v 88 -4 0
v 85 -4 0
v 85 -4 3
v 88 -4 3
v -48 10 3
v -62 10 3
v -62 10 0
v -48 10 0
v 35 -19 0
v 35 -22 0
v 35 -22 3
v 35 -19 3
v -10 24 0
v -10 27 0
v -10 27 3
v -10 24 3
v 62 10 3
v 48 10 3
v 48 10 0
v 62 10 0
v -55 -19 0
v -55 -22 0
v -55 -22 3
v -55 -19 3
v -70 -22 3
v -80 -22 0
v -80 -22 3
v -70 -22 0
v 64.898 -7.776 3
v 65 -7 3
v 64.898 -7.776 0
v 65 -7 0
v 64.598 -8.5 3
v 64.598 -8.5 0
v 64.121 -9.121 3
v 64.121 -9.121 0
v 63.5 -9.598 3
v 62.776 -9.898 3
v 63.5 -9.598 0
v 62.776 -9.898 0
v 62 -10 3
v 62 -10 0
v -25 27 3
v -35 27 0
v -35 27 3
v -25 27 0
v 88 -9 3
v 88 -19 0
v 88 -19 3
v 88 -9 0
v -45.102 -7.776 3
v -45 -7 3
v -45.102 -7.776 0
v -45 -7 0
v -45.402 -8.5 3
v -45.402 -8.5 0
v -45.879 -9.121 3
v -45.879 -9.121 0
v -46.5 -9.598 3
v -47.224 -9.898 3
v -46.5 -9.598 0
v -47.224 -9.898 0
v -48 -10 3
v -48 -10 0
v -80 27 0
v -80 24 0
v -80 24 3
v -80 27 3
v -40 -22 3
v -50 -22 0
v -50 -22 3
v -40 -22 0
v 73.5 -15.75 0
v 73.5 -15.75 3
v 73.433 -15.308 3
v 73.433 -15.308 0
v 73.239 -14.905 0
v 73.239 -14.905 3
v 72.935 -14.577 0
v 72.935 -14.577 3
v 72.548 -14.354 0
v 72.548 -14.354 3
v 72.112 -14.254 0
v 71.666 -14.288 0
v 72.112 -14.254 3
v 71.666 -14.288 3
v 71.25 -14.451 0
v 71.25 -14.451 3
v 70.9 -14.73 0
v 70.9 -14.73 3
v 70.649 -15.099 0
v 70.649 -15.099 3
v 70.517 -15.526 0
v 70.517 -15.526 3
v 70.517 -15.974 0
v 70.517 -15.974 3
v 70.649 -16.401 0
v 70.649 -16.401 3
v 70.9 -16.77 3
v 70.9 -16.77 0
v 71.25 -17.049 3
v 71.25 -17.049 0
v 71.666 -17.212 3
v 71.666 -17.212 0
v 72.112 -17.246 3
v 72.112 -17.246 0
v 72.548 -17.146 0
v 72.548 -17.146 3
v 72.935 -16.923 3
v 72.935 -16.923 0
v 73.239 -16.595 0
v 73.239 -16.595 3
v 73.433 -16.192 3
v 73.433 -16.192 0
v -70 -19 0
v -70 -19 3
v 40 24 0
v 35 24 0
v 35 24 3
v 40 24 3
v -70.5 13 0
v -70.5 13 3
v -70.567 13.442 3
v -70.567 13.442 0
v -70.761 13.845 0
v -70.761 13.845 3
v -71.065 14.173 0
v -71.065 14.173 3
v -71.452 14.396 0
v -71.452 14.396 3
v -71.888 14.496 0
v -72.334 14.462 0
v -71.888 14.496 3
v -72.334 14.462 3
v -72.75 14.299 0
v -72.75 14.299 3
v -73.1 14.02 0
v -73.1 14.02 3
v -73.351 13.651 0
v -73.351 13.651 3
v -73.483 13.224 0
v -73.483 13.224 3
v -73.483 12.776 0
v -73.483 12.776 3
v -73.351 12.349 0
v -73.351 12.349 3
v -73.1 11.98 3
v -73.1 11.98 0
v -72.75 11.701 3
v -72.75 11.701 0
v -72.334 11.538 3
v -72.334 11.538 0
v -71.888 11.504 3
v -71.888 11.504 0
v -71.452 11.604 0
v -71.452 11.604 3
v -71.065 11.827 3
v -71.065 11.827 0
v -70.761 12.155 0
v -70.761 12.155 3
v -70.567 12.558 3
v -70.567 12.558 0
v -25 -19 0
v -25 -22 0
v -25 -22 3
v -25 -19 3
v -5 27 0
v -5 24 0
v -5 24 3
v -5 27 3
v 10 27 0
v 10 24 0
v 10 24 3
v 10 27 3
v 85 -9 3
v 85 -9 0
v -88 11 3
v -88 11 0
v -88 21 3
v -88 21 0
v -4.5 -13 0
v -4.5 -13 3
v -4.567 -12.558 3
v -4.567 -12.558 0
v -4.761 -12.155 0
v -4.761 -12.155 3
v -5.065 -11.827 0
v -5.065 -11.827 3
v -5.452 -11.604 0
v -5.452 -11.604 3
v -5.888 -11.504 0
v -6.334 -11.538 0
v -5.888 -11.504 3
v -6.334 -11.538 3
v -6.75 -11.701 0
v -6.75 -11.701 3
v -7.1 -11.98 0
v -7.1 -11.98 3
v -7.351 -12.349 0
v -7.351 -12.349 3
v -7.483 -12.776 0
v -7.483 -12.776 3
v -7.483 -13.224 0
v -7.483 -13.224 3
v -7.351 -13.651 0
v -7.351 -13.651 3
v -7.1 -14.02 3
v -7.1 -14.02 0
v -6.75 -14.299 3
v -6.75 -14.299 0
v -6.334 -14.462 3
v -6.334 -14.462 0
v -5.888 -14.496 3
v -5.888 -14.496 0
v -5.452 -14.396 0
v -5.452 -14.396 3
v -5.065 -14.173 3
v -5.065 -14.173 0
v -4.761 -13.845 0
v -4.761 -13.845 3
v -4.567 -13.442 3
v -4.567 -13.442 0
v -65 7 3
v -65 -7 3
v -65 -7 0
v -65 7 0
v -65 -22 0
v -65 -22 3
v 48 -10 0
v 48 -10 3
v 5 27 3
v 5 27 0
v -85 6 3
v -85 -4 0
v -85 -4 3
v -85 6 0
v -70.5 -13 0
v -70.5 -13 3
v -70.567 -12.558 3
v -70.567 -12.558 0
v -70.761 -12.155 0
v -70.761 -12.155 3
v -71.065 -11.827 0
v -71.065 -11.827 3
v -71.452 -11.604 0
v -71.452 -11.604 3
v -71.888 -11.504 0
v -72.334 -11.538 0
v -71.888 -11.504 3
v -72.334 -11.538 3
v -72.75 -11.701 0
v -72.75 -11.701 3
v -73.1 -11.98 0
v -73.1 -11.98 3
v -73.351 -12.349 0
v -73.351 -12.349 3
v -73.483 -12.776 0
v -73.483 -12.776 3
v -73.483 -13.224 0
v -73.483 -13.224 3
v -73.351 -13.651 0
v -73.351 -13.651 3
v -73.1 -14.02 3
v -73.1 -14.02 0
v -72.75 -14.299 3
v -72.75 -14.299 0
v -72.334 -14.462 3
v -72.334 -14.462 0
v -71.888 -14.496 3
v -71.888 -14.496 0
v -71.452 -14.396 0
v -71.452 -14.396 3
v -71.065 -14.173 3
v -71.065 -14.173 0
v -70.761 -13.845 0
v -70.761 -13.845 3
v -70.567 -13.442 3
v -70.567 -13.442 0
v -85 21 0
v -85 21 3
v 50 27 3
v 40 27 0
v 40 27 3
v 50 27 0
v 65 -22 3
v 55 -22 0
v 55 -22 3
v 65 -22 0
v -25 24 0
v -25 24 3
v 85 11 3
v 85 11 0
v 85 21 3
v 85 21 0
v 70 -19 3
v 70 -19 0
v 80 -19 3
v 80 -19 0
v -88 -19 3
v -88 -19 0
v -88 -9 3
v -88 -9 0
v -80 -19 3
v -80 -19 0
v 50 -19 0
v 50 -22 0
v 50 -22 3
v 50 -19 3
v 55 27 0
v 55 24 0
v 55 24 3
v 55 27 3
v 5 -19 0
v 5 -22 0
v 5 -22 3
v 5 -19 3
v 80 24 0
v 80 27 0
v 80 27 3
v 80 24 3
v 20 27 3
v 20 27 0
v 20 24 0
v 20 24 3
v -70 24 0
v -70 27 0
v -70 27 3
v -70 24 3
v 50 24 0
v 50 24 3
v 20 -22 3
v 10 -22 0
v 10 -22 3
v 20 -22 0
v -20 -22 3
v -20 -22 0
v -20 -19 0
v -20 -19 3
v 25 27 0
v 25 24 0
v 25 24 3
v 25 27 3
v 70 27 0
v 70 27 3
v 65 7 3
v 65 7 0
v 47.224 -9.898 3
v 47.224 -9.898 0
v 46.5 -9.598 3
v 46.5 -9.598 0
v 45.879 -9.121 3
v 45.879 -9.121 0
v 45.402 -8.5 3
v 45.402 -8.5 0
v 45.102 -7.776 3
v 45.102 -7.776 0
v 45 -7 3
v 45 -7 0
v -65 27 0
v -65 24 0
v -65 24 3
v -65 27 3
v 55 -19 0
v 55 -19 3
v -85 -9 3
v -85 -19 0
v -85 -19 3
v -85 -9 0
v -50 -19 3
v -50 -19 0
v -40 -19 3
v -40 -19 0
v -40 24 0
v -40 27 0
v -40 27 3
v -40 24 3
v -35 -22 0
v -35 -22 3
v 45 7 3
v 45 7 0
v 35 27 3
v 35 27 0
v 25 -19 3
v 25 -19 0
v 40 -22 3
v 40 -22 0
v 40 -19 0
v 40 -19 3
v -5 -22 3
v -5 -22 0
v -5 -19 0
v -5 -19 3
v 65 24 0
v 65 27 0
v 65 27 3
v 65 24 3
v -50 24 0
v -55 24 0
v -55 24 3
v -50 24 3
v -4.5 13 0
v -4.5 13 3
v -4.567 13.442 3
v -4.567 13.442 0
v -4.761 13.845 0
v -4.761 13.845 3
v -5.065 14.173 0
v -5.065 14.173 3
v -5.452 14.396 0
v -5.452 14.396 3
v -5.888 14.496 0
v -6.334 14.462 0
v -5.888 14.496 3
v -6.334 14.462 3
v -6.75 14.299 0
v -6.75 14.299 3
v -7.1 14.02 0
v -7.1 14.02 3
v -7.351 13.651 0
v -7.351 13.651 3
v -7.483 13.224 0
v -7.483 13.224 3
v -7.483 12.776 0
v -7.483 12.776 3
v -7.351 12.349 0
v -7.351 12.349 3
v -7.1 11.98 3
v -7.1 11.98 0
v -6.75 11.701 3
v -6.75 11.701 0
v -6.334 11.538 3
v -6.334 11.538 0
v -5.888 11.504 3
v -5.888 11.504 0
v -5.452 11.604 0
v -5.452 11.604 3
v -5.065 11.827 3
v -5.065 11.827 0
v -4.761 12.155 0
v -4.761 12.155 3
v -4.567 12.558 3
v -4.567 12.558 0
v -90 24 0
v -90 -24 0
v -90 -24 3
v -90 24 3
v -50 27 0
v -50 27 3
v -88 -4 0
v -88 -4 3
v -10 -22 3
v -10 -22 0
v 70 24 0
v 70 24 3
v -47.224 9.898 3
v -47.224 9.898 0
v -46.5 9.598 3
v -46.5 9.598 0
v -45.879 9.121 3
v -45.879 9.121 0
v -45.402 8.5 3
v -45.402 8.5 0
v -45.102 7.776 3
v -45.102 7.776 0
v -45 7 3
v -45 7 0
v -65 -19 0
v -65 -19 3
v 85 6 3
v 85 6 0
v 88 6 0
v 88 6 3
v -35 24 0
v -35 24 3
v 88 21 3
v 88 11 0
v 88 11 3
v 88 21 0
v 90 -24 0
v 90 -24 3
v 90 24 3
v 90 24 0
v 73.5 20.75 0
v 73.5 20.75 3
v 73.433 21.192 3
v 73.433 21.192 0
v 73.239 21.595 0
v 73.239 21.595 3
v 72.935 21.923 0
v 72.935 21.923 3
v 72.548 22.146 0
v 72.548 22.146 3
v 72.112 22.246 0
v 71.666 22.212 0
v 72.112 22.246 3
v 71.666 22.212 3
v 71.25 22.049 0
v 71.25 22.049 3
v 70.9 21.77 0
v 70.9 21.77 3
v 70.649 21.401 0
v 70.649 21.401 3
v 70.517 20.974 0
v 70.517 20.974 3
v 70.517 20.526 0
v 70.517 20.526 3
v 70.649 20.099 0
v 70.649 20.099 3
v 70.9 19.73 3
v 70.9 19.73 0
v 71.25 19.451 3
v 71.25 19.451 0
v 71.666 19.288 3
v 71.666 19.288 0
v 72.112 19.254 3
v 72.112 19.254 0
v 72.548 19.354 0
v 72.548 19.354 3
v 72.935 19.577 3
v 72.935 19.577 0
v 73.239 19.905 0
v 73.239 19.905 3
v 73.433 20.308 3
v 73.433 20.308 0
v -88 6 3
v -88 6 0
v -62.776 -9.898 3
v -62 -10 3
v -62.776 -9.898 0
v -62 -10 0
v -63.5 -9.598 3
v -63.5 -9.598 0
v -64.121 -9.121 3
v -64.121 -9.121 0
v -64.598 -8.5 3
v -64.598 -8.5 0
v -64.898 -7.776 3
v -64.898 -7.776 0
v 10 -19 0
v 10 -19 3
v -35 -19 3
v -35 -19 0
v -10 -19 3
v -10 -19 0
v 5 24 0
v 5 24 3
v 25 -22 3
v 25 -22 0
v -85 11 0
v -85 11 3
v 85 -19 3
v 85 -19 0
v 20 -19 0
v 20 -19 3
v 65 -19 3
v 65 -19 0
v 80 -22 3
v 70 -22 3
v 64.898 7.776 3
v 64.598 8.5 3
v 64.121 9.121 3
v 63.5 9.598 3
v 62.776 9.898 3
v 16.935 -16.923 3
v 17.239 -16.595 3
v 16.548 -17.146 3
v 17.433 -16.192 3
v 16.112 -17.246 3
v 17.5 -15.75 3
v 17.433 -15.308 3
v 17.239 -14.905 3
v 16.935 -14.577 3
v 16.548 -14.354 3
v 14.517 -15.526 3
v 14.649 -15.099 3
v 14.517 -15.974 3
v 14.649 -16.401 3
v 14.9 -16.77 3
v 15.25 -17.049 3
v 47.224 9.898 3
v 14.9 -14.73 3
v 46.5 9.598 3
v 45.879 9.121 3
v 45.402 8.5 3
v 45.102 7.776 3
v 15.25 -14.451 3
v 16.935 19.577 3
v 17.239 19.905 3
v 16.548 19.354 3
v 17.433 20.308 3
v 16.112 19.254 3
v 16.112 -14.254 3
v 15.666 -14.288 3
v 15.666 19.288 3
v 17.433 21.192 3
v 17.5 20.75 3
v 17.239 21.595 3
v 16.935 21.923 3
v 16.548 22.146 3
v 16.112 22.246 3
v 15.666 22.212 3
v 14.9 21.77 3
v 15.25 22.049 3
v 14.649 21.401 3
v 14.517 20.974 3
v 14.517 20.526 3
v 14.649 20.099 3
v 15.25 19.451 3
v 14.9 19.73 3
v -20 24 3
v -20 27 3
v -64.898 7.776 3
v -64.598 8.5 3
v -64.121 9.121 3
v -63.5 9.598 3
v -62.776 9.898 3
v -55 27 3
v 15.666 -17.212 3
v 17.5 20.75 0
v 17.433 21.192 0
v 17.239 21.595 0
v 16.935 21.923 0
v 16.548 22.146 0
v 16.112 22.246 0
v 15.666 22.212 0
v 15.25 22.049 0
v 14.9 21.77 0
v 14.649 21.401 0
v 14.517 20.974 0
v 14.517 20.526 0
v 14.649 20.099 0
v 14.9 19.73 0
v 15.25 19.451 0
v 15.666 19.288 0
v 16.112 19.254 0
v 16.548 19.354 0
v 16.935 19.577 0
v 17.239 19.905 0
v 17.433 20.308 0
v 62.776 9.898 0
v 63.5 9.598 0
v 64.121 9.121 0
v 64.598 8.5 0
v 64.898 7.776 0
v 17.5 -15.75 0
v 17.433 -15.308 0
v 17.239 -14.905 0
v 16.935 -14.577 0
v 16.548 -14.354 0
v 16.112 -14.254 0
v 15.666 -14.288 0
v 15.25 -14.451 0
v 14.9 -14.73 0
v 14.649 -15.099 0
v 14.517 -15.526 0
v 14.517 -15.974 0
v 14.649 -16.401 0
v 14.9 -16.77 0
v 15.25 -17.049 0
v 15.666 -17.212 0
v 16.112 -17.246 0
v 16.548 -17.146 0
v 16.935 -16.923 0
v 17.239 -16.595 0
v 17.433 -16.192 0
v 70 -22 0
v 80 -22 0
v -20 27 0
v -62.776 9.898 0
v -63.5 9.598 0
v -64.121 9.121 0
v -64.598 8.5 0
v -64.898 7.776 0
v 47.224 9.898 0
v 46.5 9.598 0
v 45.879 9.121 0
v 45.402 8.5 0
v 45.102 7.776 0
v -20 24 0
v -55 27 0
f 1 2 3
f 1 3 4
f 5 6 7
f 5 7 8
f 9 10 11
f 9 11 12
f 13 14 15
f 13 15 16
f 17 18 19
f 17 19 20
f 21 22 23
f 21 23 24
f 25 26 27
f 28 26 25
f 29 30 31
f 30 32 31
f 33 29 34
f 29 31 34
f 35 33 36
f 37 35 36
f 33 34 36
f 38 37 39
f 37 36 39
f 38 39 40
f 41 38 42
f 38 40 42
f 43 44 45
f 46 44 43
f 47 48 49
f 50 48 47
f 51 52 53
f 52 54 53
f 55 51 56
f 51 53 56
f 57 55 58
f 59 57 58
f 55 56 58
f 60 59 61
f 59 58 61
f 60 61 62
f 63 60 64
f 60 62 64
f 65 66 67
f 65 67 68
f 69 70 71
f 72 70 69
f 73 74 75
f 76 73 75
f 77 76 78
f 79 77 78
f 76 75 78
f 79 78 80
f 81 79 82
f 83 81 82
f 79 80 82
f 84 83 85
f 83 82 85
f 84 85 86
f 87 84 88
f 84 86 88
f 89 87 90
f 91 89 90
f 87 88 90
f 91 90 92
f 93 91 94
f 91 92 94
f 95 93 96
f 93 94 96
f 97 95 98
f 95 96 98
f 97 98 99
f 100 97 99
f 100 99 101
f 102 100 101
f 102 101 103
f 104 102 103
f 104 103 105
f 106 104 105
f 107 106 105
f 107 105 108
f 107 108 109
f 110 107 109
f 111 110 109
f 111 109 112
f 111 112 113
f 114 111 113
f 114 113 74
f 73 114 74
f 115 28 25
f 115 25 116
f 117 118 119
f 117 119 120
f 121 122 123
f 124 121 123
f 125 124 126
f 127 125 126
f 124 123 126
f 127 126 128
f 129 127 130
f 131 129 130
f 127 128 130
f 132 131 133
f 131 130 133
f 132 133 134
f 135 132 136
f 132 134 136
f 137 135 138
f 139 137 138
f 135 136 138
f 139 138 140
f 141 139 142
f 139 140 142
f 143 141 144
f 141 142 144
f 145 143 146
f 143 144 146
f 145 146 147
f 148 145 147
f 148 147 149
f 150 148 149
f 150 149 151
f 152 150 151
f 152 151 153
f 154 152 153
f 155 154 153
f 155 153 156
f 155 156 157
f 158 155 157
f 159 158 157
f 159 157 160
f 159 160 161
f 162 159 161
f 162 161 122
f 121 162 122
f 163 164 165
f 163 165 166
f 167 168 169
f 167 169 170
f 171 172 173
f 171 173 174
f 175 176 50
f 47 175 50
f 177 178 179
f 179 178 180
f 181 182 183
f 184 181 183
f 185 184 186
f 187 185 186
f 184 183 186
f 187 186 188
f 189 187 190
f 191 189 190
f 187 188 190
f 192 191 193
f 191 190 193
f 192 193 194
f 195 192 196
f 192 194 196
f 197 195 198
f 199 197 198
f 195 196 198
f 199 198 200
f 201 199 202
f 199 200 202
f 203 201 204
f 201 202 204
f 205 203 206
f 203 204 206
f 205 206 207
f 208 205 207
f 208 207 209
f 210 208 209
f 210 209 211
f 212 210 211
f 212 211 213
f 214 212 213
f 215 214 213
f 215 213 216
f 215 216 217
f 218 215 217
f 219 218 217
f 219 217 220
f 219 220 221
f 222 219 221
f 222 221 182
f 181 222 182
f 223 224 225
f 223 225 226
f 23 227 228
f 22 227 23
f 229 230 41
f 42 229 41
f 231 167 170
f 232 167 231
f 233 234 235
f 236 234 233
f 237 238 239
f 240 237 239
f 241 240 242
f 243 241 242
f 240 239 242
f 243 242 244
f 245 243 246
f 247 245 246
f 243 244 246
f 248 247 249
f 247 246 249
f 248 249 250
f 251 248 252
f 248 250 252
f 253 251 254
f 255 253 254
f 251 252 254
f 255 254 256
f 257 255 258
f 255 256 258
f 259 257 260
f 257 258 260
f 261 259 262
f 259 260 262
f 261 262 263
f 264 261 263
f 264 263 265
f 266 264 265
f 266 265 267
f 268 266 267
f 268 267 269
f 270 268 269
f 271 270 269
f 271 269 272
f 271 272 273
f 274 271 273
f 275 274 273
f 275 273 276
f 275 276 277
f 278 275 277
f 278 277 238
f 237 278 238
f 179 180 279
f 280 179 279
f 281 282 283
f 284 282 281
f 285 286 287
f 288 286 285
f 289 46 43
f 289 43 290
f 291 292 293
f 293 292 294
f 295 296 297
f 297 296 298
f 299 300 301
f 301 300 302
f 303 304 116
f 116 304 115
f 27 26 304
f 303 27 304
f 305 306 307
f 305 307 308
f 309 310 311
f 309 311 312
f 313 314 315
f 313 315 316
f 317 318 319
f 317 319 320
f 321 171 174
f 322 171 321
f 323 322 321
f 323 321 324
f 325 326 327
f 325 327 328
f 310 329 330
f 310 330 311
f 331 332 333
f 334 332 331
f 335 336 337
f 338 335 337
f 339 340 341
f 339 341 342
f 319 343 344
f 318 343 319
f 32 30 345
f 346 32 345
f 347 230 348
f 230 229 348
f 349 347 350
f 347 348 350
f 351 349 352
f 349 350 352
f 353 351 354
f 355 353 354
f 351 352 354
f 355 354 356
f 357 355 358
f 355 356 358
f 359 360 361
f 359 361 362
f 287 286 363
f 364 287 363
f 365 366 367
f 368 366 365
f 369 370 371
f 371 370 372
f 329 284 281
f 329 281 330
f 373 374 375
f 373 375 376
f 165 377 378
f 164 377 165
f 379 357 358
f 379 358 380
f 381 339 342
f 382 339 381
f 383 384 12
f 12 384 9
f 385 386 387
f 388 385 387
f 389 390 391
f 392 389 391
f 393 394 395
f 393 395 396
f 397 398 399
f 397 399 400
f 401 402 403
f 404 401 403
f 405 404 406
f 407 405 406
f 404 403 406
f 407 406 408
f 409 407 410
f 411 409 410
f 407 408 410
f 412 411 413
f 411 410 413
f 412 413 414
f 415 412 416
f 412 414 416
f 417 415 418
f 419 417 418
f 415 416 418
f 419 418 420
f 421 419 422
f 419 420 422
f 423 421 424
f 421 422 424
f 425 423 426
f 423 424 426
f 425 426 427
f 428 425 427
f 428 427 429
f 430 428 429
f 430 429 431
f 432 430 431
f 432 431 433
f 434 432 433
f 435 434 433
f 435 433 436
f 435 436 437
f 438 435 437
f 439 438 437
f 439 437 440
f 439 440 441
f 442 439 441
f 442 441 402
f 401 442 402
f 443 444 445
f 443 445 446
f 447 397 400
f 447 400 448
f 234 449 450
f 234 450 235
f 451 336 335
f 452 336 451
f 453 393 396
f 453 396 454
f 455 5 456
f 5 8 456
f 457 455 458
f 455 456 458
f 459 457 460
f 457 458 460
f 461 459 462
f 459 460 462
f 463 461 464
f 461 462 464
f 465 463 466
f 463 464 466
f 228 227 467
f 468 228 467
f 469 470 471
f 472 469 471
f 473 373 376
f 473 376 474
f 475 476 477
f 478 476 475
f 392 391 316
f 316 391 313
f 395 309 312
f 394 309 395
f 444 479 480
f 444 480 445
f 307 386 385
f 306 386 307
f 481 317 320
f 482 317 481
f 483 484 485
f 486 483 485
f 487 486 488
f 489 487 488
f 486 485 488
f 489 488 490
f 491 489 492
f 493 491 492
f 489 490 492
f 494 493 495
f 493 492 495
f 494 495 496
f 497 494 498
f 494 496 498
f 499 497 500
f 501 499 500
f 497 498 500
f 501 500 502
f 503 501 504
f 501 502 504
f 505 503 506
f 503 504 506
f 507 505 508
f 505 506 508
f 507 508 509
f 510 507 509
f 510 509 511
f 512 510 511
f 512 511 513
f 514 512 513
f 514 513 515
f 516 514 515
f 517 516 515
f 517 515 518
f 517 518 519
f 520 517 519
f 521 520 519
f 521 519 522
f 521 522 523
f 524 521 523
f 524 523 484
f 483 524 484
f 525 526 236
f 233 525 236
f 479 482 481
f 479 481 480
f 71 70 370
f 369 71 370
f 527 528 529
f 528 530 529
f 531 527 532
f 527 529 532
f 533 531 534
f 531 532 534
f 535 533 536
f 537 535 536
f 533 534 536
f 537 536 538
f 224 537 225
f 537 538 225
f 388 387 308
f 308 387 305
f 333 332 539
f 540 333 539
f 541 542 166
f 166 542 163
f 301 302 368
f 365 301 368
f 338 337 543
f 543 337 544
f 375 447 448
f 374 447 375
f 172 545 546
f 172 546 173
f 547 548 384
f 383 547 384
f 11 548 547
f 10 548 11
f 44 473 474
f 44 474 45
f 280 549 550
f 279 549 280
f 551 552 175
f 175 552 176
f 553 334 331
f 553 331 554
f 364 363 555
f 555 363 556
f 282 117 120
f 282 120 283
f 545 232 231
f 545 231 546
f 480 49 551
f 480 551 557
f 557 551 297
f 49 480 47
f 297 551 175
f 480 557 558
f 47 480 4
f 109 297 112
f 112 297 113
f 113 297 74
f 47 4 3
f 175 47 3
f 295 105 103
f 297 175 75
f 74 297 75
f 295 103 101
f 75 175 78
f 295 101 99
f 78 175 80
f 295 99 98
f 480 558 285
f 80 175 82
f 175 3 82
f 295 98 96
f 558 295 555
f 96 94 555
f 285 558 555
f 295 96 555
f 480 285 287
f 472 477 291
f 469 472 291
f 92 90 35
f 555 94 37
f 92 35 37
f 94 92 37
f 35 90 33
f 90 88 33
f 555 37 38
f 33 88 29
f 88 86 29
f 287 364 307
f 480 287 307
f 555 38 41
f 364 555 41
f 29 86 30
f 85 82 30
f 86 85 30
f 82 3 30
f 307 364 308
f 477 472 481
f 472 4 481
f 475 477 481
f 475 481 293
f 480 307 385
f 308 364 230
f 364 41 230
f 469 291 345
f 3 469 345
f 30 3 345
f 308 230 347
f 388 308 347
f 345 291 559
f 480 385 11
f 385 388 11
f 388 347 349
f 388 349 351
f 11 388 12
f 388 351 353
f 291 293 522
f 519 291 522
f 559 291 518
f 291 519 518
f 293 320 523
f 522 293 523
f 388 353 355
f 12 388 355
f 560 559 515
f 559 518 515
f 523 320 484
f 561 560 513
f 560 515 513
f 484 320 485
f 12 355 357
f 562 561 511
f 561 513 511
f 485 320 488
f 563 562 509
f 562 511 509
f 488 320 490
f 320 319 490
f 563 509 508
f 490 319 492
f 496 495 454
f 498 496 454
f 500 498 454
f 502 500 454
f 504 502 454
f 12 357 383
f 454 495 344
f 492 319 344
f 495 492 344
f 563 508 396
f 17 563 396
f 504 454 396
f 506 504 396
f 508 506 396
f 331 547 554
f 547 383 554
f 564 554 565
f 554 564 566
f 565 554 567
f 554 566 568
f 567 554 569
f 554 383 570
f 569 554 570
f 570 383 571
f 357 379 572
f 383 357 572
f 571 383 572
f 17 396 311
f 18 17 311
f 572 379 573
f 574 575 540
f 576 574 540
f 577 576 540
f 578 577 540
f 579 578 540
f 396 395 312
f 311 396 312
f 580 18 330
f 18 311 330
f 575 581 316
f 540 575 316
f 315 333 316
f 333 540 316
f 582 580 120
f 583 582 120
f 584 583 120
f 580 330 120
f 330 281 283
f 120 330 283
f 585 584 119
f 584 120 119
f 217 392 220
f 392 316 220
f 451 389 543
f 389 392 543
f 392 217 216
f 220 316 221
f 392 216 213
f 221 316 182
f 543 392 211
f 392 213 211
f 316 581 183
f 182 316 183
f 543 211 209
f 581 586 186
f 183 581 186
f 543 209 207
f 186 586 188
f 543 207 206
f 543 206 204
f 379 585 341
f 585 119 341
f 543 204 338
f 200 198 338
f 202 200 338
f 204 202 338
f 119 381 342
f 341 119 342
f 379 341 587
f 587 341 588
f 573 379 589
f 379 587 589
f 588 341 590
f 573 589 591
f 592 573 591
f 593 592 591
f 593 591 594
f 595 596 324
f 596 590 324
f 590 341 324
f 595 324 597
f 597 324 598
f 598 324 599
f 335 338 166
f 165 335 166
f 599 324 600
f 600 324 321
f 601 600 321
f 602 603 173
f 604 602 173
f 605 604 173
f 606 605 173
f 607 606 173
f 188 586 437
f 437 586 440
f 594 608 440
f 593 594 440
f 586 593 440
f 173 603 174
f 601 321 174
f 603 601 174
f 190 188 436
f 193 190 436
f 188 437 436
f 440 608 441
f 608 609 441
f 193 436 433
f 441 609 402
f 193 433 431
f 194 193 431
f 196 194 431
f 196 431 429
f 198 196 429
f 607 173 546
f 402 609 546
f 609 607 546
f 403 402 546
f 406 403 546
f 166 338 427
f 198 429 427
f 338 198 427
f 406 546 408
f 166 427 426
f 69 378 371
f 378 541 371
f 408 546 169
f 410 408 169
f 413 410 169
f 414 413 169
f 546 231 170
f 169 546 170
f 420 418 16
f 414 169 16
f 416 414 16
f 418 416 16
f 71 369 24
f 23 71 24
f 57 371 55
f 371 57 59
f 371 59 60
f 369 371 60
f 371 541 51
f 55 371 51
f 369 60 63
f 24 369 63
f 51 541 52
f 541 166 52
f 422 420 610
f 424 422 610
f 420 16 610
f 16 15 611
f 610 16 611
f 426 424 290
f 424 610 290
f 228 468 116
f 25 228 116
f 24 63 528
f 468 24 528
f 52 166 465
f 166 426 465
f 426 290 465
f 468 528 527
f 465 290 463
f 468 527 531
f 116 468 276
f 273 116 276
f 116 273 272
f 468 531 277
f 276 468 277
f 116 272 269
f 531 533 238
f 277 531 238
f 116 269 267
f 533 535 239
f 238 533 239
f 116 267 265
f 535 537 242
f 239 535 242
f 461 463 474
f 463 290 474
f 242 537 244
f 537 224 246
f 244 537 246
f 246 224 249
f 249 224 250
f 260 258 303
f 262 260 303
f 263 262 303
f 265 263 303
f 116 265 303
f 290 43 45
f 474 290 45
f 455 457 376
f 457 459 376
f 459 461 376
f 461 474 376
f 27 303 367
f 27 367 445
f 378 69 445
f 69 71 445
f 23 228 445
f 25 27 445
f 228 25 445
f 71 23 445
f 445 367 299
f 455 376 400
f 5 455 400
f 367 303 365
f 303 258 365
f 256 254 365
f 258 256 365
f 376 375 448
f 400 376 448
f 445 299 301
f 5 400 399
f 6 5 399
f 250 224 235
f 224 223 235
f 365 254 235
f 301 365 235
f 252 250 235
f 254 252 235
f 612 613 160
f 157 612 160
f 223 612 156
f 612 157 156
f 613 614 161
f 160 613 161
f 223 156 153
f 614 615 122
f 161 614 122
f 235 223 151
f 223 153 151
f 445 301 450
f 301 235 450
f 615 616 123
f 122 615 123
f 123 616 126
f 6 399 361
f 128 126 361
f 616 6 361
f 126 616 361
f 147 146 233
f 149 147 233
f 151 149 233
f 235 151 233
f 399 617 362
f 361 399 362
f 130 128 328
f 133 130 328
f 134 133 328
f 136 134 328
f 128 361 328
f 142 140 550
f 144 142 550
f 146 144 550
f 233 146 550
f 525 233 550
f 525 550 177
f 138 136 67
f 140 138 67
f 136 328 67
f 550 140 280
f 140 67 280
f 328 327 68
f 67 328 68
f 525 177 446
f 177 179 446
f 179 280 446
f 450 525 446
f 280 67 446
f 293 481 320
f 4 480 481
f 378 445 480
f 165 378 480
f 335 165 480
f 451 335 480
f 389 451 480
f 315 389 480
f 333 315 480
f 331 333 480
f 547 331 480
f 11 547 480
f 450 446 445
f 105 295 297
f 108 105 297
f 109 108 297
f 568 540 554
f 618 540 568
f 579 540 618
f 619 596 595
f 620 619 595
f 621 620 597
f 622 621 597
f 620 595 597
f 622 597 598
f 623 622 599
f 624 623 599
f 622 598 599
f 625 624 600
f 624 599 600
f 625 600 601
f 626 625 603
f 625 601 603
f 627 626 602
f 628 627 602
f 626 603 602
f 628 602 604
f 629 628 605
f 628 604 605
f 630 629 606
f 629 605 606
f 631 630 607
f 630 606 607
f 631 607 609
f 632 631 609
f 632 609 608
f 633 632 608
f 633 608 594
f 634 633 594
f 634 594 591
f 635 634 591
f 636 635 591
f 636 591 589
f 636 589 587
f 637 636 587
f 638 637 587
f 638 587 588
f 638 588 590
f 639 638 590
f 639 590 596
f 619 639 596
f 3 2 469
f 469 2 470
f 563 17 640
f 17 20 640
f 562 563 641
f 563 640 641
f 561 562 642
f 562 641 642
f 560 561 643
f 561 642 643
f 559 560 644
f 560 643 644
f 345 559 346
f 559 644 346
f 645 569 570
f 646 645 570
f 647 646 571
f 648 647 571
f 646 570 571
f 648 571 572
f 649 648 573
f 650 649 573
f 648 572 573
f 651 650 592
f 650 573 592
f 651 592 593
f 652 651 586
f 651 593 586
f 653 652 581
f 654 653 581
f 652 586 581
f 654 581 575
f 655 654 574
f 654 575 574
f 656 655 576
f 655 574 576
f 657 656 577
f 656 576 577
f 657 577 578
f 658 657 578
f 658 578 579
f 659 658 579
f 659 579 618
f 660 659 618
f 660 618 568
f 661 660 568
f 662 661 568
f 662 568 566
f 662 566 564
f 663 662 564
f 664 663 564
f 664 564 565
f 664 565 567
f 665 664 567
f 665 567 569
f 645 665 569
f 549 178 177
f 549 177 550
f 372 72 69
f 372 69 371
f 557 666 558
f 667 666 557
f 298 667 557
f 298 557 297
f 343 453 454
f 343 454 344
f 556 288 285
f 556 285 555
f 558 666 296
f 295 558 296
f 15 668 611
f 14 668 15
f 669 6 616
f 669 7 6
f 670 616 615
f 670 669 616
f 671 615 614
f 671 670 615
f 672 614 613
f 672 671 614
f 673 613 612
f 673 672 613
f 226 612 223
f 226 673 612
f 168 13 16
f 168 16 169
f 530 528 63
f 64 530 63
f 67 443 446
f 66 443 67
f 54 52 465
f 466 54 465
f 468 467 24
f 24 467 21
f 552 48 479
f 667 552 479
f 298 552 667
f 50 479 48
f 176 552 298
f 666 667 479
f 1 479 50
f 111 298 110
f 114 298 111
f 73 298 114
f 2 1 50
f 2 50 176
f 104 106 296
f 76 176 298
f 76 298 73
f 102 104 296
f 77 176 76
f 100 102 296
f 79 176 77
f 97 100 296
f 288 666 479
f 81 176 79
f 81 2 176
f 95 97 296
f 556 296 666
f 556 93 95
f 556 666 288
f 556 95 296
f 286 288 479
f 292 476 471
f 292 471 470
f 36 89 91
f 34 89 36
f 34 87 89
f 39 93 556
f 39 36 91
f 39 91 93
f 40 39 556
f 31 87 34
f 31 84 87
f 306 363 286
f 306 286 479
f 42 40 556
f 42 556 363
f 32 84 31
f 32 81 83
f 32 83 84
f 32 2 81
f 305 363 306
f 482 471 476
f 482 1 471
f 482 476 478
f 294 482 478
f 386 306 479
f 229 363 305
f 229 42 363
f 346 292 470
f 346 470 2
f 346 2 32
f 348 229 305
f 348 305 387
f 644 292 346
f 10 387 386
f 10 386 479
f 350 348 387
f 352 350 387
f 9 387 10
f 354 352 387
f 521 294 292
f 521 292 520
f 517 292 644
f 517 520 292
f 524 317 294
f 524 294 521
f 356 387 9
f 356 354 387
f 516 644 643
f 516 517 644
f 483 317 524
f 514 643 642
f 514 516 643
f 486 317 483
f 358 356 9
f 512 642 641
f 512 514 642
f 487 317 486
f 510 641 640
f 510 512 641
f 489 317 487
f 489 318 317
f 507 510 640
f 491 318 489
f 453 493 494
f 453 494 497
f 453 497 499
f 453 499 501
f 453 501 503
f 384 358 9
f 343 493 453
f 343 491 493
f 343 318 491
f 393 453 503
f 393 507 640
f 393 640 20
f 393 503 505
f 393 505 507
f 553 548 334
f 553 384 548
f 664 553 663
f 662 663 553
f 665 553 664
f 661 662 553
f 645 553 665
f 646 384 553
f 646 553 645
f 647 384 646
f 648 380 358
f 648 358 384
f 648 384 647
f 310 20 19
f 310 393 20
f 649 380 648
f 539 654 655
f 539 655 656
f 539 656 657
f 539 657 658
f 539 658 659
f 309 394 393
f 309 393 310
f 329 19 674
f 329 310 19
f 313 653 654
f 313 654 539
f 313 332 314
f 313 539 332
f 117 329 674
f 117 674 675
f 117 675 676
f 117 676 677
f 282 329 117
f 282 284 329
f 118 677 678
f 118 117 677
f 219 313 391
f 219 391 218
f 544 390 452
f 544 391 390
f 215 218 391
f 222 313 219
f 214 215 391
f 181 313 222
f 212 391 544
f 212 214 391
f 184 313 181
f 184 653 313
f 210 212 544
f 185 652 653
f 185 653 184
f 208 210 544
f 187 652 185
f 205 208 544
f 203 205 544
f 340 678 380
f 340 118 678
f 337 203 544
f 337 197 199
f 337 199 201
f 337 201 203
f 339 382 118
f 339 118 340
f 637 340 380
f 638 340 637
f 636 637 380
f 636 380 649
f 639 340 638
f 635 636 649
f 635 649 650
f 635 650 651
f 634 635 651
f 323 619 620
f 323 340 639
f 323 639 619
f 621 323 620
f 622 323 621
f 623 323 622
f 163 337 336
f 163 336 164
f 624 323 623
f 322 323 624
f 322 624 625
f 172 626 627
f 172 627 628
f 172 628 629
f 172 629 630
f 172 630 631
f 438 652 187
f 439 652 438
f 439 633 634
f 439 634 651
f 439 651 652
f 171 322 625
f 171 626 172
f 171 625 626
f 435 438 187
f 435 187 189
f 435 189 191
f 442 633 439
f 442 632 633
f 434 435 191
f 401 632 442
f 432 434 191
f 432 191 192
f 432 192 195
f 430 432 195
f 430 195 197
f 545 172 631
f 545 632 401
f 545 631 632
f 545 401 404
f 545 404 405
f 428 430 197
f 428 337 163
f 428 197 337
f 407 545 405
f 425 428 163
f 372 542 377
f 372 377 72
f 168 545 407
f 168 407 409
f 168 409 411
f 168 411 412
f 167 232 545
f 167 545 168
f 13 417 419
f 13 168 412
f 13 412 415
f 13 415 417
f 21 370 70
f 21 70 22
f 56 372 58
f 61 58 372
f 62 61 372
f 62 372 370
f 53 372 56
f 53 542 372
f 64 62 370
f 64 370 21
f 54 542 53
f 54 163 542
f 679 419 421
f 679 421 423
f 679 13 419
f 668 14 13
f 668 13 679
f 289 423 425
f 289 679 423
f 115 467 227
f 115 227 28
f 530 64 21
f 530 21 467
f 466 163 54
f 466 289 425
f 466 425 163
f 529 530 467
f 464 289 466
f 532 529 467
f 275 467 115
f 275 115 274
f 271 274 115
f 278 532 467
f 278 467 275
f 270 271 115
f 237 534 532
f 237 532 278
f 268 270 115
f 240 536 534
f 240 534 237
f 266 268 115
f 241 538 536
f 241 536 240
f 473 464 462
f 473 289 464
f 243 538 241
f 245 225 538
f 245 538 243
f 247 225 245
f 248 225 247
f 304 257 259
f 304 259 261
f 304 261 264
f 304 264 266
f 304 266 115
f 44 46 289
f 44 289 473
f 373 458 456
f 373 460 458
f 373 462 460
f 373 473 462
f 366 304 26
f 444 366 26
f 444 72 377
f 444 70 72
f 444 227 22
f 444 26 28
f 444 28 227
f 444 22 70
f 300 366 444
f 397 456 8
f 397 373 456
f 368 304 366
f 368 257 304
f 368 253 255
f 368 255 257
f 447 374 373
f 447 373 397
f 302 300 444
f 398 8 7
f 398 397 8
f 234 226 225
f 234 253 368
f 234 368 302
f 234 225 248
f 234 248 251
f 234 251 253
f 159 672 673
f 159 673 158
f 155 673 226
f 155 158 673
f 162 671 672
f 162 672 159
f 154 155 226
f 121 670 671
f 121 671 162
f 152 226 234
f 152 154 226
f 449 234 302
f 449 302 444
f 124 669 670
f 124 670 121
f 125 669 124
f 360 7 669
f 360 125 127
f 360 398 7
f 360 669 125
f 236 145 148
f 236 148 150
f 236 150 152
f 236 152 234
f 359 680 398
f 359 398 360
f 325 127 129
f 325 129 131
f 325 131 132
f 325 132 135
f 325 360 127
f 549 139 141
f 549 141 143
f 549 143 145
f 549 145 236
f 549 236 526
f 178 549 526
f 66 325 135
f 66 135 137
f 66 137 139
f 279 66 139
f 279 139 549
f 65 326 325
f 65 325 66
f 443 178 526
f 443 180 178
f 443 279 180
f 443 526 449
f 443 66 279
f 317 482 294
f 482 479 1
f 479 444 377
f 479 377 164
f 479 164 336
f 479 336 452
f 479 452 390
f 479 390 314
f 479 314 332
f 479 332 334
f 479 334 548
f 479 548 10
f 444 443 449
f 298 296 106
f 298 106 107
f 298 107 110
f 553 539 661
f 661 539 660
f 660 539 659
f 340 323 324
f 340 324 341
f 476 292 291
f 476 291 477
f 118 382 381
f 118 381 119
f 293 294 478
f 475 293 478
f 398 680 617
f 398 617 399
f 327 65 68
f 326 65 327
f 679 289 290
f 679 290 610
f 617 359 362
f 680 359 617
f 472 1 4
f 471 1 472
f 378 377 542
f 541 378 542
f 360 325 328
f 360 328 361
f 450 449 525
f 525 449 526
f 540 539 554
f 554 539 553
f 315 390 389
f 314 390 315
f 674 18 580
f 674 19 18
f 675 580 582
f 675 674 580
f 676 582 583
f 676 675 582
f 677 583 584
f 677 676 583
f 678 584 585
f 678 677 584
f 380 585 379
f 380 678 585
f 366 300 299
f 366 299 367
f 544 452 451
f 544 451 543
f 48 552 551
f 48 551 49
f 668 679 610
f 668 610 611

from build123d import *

# Parameters (mm, degrees)
SKETCH_1_W          = 3
SKETCH_1_H          = 10
SKETCH_1_W_2        = 10
SKETCH_1_H_2        = 3
EXTRUDE_1_DEPTH     = 3
SKETCH_2_W          = 20
SKETCH_2_H          = 20
CUT_EXTRUDE_1_DEPTH = 10
FILLET_1_R          = 3
SKETCH_3_R          = 1.5
CUT_EXTRUDE_2_DEPTH = 10


with BuildPart() as part:
    # 草图1 → 凸台-拉伸1 (new body)
    with BuildSketch(Plane.XY):
        Polygon((-90, 24), (-80, 24), (-80, 27), (-70, 27), (-70, 24), (-65, 24), (-65, 27), (-55, 27), (-55, 24), (-50, 24), (-50, 27), (-40, 27), (-40, 24), (-35, 24), (-35, 27), (-25, 27), (-25, 24), (-20, 24), (-20, 27), (-10, 27), (-10, 24), (-5, 24), (-5, 27), (5, 27), (5, 24), (10, 24), (10, 27), (20, 27), (20, 24), (25, 24), (25, 27), (35, 27), (35, 24), (40, 24), (40, 27), (50, 27), (50, 24), (55, 24), (55, 27), (65, 27), (65, 24), (70, 24), (70, 27), (80, 27), (80, 24), (90, 24), (90, -24), (-90, -24), align=None)
        with Locations((-86.5, 1)):
            Rectangle(SKETCH_1_W, SKETCH_1_H, mode=Mode.SUBTRACT)
        with Locations((-86.5, 16)):
            Rectangle(SKETCH_1_W, SKETCH_1_H, mode=Mode.SUBTRACT)
        with Locations((-86.5, -14)):
            Rectangle(SKETCH_1_W, SKETCH_1_H, mode=Mode.SUBTRACT)
        with Locations((86.5, -14)):
            Rectangle(SKETCH_1_W, SKETCH_1_H, mode=Mode.SUBTRACT)
        with Locations((86.5, 1)):
            Rectangle(SKETCH_1_W, SKETCH_1_H, mode=Mode.SUBTRACT)
        with Locations((86.5, 16)):
            Rectangle(SKETCH_1_W, SKETCH_1_H, mode=Mode.SUBTRACT)
        with Locations((-60, -20.5)):
            Rectangle(SKETCH_1_W_2, SKETCH_1_H_2, mode=Mode.SUBTRACT)
        with Locations((-75, -20.5)):
            Rectangle(SKETCH_1_W_2, SKETCH_1_H_2, mode=Mode.SUBTRACT)
        with Locations((-45, -20.5)):
            Rectangle(SKETCH_1_W_2, SKETCH_1_H_2, mode=Mode.SUBTRACT)
        with Locations((-30, -20.5)):
            Rectangle(SKETCH_1_W_2, SKETCH_1_H_2, mode=Mode.SUBTRACT)
        with Locations((-15, -20.5)):
            Rectangle(SKETCH_1_W_2, SKETCH_1_H_2, mode=Mode.SUBTRACT)
        with Locations((0, -20.5)):
            Rectangle(SKETCH_1_W_2, SKETCH_1_H_2, mode=Mode.SUBTRACT)
        with Locations((15, -20.5)):
            Rectangle(SKETCH_1_W_2, SKETCH_1_H_2, mode=Mode.SUBTRACT)
        with Locations((30, -20.5)):
            Rectangle(SKETCH_1_W_2, SKETCH_1_H_2, mode=Mode.SUBTRACT)
        with Locations((45, -20.5)):
            Rectangle(SKETCH_1_W_2, SKETCH_1_H_2, mode=Mode.SUBTRACT)
        with Locations((60, -20.5)):
            Rectangle(SKETCH_1_W_2, SKETCH_1_H_2, mode=Mode.SUBTRACT)
        with Locations((75, -20.5)):
            Rectangle(SKETCH_1_W_2, SKETCH_1_H_2, mode=Mode.SUBTRACT)
    extrude(amount=EXTRUDE_1_DEPTH)

    # 草图2 → 切除-拉伸1 (cut)
    with BuildSketch(Plane.XY.offset(3)):
        with Locations((55, 0)):
            Rectangle(SKETCH_2_W, SKETCH_2_H)
        with Locations((-55, 0)):
            Rectangle(SKETCH_2_W, SKETCH_2_H)
    extrude(amount=-CUT_EXTRUDE_1_DEPTH, mode=Mode.SUBTRACT)

    # 圆角1
    fillet_1_edges = [part.edges().sort_by_distance(p)[0] for p in [
        (65, 10, 1.5),
        (65, -10, 1.5),
        (45, -10, 1.5),
        (45, 10, 1.5),
        (-45, 10, 1.5),
        (-45, -10, 1.5),
        (-65, -10, 1.5),
        (-65, 10, 1.5),
    ]]
    fillet(fillet_1_edges, radius=FILLET_1_R)

    # 草图3 → 切除-拉伸2 (cut)
    with BuildSketch(Plane.XY.offset(3)):
        with Locations((-72, 13)):
            Circle(SKETCH_3_R)
        with Locations((-6, 13)):
            Circle(SKETCH_3_R)
        with Locations((-72, -13)):
            Circle(SKETCH_3_R)
        with Locations((-6, -13)):
            Circle(SKETCH_3_R)
        with Locations((16, 20.75)):
            Circle(SKETCH_3_R)
        with Locations((16, -15.75)):
            Circle(SKETCH_3_R)
        with Locations((72, 20.75)):
            Circle(SKETCH_3_R)
        with Locations((72, -15.75)):
            Circle(SKETCH_3_R)
    extrude(amount=-CUT_EXTRUDE_2_DEPTH, mode=Mode.SUBTRACT)


solid = part.part
